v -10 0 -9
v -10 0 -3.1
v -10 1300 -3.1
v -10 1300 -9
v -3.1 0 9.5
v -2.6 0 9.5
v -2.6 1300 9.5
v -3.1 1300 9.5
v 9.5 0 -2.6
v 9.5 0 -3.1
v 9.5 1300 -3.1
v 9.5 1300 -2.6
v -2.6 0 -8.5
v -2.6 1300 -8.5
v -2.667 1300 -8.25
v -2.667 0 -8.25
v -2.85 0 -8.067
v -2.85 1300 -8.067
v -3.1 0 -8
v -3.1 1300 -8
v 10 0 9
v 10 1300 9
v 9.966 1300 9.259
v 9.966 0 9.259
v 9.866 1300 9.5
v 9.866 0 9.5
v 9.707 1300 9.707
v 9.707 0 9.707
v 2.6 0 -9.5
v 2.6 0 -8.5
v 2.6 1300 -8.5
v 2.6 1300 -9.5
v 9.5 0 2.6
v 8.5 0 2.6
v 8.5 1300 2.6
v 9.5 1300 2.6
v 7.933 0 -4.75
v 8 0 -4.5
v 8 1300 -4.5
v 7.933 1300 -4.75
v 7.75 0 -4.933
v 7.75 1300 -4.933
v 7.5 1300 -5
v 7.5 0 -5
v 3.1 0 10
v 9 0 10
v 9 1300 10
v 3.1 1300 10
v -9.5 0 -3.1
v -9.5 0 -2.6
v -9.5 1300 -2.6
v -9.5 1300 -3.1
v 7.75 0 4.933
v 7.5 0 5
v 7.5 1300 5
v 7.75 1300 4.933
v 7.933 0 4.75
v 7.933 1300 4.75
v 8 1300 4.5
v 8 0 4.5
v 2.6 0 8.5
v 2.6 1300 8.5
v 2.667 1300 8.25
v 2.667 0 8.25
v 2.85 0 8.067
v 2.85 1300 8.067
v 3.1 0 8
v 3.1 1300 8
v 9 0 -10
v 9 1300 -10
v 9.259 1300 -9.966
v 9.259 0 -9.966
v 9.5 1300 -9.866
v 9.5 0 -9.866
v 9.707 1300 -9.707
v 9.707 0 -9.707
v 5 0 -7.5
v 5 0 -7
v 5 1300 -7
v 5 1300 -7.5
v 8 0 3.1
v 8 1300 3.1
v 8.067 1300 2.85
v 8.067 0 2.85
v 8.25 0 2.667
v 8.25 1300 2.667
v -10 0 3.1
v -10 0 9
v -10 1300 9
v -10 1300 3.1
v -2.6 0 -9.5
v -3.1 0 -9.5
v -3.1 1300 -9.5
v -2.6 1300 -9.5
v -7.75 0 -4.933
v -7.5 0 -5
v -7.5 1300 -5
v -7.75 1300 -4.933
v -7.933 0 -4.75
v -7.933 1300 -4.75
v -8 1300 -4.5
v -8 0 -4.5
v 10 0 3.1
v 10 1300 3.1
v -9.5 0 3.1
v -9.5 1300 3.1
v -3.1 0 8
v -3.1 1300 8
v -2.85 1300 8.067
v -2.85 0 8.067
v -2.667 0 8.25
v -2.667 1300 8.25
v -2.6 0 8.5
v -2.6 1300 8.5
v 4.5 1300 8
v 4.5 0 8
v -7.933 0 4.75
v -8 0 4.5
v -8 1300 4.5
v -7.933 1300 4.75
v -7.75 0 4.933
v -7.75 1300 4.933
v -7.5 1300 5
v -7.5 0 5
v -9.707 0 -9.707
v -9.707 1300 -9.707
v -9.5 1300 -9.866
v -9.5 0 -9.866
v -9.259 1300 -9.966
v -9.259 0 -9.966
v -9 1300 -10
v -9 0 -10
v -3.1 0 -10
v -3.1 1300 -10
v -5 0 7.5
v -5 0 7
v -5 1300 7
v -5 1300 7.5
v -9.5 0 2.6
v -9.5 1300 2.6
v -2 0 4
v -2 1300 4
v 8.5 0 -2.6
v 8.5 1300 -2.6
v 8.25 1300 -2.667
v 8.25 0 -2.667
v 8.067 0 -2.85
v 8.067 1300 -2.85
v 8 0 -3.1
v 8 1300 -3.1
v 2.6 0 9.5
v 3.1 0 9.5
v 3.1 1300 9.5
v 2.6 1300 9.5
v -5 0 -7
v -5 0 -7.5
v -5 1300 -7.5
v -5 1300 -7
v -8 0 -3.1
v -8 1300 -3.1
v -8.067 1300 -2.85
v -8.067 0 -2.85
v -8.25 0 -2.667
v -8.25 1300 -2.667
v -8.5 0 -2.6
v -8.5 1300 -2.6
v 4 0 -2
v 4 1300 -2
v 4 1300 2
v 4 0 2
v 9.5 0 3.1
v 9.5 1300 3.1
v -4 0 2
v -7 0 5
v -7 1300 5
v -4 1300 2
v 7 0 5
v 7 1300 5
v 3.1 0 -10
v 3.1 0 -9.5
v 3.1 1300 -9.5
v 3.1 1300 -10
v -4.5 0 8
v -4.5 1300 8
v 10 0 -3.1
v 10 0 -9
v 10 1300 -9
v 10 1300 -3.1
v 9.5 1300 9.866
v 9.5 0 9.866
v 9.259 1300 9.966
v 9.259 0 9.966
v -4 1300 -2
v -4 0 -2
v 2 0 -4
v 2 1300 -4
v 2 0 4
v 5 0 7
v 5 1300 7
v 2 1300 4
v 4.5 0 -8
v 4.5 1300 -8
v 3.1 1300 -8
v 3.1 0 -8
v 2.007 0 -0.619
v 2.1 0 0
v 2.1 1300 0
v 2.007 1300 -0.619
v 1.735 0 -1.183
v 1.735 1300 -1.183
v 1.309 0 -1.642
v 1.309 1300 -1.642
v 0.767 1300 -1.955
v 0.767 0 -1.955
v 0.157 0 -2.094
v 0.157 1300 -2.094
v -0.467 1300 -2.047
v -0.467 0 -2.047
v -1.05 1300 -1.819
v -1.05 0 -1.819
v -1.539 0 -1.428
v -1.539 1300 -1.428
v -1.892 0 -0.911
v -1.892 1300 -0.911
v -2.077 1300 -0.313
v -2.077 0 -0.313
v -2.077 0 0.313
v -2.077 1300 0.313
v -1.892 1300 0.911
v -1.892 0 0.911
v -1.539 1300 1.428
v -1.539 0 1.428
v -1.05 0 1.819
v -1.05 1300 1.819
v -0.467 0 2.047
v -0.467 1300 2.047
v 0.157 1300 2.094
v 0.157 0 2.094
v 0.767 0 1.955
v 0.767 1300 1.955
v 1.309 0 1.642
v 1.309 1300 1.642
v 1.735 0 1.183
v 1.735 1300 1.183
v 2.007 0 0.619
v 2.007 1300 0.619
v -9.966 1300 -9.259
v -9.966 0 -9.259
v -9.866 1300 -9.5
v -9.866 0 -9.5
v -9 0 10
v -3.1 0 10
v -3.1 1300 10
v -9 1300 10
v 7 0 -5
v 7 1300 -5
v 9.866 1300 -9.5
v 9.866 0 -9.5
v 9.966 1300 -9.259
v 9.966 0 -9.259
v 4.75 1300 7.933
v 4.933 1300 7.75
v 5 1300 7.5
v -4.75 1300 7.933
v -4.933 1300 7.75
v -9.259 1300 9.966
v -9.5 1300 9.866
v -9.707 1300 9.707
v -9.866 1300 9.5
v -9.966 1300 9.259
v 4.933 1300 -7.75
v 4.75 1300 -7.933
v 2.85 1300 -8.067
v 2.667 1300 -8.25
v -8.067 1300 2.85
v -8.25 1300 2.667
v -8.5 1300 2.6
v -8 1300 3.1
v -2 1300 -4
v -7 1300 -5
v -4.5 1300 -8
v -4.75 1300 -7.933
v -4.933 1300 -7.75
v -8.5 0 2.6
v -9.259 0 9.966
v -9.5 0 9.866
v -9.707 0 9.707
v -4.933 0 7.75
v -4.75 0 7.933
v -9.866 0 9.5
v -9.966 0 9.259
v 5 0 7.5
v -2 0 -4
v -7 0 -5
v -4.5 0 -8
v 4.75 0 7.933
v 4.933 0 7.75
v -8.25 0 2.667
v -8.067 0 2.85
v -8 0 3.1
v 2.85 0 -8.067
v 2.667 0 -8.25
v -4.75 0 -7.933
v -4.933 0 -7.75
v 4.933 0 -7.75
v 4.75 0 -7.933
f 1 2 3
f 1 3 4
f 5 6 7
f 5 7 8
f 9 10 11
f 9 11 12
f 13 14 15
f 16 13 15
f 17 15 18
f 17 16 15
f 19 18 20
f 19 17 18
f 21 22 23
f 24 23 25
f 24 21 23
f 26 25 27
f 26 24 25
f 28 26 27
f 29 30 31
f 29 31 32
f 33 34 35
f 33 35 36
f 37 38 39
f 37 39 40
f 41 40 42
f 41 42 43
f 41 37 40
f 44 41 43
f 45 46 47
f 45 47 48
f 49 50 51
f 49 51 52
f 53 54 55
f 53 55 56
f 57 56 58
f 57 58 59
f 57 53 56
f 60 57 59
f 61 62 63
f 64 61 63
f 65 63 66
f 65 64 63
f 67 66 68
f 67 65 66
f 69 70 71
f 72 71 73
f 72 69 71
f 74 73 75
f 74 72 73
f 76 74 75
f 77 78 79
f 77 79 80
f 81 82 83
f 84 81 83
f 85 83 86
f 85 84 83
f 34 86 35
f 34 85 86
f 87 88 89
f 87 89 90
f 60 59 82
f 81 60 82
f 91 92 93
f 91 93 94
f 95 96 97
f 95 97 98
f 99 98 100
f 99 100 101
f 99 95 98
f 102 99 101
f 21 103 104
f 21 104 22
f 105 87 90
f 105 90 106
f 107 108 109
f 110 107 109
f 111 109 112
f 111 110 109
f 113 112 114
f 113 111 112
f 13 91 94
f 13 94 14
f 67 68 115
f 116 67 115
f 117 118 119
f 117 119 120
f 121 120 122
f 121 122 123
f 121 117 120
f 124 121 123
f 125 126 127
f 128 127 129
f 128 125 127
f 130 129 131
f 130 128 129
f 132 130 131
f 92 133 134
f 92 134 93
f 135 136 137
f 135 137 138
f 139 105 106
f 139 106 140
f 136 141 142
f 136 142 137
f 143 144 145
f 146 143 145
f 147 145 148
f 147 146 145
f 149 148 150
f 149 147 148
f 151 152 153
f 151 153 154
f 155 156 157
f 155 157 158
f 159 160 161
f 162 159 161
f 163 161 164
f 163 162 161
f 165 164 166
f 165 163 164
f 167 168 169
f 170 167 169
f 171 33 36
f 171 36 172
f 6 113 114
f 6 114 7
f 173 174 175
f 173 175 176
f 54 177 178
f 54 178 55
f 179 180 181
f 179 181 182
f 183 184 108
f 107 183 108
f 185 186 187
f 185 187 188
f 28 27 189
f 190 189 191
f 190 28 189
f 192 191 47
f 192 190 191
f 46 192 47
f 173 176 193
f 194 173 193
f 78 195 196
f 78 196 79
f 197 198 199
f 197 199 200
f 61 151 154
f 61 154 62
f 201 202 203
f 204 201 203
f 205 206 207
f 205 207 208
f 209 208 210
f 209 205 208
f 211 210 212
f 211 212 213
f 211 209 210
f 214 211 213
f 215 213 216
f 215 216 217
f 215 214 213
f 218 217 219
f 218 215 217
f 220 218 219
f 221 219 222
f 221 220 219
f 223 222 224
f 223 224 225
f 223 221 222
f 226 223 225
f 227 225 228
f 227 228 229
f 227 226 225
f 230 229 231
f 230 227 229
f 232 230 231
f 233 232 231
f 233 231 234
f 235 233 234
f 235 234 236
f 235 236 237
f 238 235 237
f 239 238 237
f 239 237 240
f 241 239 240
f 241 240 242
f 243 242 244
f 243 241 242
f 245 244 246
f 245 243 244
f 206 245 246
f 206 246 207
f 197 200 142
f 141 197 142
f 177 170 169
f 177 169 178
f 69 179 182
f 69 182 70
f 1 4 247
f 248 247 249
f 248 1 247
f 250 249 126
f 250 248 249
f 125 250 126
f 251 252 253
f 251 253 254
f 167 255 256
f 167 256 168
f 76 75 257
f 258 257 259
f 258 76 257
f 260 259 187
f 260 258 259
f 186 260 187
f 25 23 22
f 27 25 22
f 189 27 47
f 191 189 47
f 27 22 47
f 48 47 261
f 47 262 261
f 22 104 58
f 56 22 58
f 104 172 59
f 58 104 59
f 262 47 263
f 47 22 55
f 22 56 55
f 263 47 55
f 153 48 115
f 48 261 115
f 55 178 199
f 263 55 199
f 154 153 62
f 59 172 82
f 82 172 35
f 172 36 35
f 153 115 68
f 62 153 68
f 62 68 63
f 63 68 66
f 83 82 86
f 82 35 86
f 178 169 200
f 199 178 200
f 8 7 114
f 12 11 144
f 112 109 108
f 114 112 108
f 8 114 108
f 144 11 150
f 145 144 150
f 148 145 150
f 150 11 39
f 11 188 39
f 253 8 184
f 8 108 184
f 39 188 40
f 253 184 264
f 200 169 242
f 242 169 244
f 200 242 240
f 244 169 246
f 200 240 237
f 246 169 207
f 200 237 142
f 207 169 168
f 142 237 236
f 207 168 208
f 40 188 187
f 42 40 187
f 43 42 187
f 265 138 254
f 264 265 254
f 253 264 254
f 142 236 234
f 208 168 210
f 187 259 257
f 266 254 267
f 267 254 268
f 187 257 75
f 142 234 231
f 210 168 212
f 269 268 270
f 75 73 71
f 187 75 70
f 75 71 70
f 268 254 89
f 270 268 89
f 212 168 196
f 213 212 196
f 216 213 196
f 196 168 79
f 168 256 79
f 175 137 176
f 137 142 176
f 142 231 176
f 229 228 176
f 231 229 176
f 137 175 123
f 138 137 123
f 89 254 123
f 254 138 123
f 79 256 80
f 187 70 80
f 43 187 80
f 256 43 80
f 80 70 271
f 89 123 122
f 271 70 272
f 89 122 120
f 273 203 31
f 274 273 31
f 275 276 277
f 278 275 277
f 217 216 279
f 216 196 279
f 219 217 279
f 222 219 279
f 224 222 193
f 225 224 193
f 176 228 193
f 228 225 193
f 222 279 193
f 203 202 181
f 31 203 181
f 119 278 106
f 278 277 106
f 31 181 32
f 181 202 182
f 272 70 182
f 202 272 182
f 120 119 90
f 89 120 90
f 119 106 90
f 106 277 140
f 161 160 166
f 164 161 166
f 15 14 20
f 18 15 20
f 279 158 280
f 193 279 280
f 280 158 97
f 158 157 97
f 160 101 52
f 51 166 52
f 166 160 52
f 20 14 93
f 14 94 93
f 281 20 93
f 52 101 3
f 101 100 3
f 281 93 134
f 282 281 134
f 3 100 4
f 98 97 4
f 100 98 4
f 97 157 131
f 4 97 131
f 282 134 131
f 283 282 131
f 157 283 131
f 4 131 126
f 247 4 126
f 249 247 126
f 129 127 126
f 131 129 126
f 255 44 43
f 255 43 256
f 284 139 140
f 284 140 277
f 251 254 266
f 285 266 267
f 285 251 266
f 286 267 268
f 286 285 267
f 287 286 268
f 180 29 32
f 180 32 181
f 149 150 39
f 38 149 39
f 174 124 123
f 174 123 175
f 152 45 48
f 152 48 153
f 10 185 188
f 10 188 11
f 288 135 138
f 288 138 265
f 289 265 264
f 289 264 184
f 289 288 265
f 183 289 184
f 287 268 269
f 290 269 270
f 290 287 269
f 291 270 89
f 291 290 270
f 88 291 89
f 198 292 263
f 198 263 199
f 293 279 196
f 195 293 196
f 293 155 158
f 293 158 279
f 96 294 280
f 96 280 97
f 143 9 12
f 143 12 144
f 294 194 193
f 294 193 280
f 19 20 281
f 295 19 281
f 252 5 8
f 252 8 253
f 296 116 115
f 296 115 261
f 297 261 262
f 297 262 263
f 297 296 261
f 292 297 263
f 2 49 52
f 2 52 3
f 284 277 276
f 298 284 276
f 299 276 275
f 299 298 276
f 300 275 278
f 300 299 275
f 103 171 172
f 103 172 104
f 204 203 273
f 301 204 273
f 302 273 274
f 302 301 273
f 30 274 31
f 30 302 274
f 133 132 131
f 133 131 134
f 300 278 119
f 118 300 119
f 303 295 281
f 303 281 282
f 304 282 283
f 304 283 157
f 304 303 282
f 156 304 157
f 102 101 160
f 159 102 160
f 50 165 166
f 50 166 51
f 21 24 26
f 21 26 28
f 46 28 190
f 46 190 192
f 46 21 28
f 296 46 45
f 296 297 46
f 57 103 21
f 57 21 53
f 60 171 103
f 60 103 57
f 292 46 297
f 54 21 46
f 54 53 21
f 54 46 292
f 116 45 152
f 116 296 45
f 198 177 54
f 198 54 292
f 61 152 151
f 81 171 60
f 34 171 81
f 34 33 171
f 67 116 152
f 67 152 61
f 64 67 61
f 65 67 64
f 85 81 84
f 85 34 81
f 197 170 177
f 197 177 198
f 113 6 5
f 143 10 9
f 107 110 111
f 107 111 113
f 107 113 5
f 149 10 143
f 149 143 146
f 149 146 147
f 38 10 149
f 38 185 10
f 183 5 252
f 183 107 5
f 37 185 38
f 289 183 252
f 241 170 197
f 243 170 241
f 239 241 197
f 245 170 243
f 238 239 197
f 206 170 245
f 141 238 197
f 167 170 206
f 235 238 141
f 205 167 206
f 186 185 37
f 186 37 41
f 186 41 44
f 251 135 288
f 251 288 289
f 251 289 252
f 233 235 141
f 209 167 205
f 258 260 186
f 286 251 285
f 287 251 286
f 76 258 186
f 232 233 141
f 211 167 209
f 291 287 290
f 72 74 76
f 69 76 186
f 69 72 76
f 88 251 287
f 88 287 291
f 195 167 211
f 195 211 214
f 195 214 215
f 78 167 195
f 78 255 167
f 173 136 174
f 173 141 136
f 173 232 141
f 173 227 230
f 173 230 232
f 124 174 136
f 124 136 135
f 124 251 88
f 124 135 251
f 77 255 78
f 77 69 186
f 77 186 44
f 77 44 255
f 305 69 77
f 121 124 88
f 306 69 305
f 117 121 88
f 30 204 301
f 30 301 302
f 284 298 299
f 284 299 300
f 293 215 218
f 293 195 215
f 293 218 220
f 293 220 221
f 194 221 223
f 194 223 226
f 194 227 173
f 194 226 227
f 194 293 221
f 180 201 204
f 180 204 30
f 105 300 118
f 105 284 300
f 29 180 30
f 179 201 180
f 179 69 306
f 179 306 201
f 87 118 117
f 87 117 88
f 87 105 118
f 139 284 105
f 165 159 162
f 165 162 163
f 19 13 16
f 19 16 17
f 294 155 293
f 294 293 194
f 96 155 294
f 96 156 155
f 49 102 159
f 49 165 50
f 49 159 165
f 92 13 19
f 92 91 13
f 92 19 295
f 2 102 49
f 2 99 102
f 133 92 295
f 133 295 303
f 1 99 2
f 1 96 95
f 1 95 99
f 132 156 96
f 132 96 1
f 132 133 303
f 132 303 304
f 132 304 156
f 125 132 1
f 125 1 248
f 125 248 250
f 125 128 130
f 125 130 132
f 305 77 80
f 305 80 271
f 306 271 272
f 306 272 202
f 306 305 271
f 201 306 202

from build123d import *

# Parameters (mm, degrees)
SKETCH_1_R      = 2.1
EXTRUDE_1_DEPTH = 1300


with BuildPart() as part:
    # 스케치1 → 보스-돌출1 (new body)
    with BuildSketch(Plane(origin=(0, 0, 0), x_dir=(1, 0, 0), z_dir=(0, 1, 0))):
        with BuildLine():
            Line((2, -4), (-2, -4))
            Line((-2, -4), (-5, -7))
            Line((-5, -7), (-5, -7.5))
            ThreePointArc((-5, -7.5), (-4.853553391, -7.853553391), (-4.5, -8))
            Line((-4.5, -8), (-3.1, -8))
            ThreePointArc((-3.1, -8), (-2.746446609, -8.146446609), (-2.6, -8.5))
            Line((-2.6, -8.5), (-2.6, -9.5))
            Line((-2.6, -9.5), (-3.1, -9.5))
            Line((-3.1, -9.5), (-3.1, -10))
            Line((-3.1, -10), (-9, -10))
            ThreePointArc((-9, -10), (-9.382683432, -9.923879533), (-9.707106781, -9.707106781))
            ThreePointArc((-9.707106781, -9.707106781), (-9.923879533, -9.382683432), (-10, -9))
            Line((-10, -9), (-10, -3.1))
            Line((-10, -3.1), (-9.5, -3.1))
            Line((-9.5, -3.1), (-9.5, -2.6))
            Line((-9.5, -2.6), (-8.5, -2.6))
            ThreePointArc((-8.5, -2.6), (-8.146446609, -2.746446609), (-8, -3.1))
            Line((-8, -3.1), (-8, -4.5))
            ThreePointArc((-8, -4.5), (-7.853553391, -4.853553391), (-7.5, -5))
            Line((-7.5, -5), (-7, -5))
            Line((-7, -5), (-4, -2))
            Line((-4, -2), (-4, 2))
            Line((-4, 2), (-7, 5))
            Line((-7, 5), (-7.5, 5))
            ThreePointArc((-7.5, 5), (-7.853553391, 4.853553391), (-8, 4.5))
            Line((-8, 4.5), (-8, 3.1))
            ThreePointArc((-8, 3.1), (-8.146446609, 2.746446609), (-8.5, 2.6))
            Line((-8.5, 2.6), (-9.5, 2.6))
            Line((-9.5, 2.6), (-9.5, 3.1))
            Line((-9.5, 3.1), (-10, 3.1))
            Line((-10, 3.1), (-10, 9))
            ThreePointArc((-10, 9), (-9.923879533, 9.382683432), (-9.707106781, 9.707106781))
            ThreePointArc((-9.707106781, 9.707106781), (-9.382683432, 9.923879533), (-9, 10))
            Line((-9, 10), (-3.1, 10))
            Line((-3.1, 10), (-3.1, 9.5))
            Line((-3.1, 9.5), (-2.6, 9.5))
            Line((-2.6, 9.5), (-2.6, 8.5))
            ThreePointArc((-2.6, 8.5), (-2.746446609, 8.146446609), (-3.1, 8))
            Line((-3.1, 8), (-4.5, 8))
            ThreePointArc((-4.5, 8), (-4.853553391, 7.853553391), (-5, 7.5))
            Line((-5, 7.5), (-5, 7))
            Line((-5, 7), (-2, 4))
            Line((-2, 4), (2, 4))
            Line((2, 4), (5, 7))
            Line((5, 7), (5, 7.5))
            ThreePointArc((5, 7.5), (4.853553391, 7.853553391), (4.5, 8))
            Line((4.5, 8), (3.1, 8))
            ThreePointArc((3.1, 8), (2.746446609, 8.146446609), (2.6, 8.5))
            Line((2.6, 8.5), (2.6, 9.5))
            Line((2.6, 9.5), (3.1, 9.5))
            Line((3.1, 9.5), (3.1, 10))
            Line((3.1, 10), (9, 10))
            ThreePointArc((9, 10), (9.382683432, 9.923879533), (9.707106781, 9.707106781))
            ThreePointArc((9.707106781, 9.707106781), (9.923879533, 9.382683432), (10, 9))
            Line((10, 9), (10, 3.1))
            Line((10, 3.1), (9.5, 3.1))
            Line((9.5, 3.1), (9.5, 2.6))
            Line((9.5, 2.6), (8.5, 2.6))
            ThreePointArc((8.5, 2.6), (8.146446609, 2.746446609), (8, 3.1))
            Line((8, 3.1), (8, 4.5))
            ThreePointArc((8, 4.5), (7.853553391, 4.853553391), (7.5, 5))
            Line((7.5, 5), (7, 5))
            Line((7, 5), (4, 2))
            Line((4, 2), (4, -2))
            Line((4, -2), (7, -5))
            Line((7, -5), (7.5, -5))
            ThreePointArc((7.5, -5), (7.853553391, -4.853553391), (8, -4.5))
            Line((8, -4.5), (8, -3.1))
            ThreePointArc((8, -3.1), (8.146446609, -2.746446609), (8.5, -2.6))
            Line((8.5, -2.6), (9.5, -2.6))
            Line((9.5, -2.6), (9.5, -3.1))
            Line((9.5, -3.1), (10, -3.1))
            Line((10, -3.1), (10, -9))
            ThreePointArc((10, -9), (9.923879533, -9.382683432), (9.707106781, -9.707106781))
            ThreePointArc((9.707106781, -9.707106781), (9.382683432, -9.923879533), (9, -10))
            Line((9, -10), (3.1, -10))
            Line((3.1, -10), (3.1, -9.5))
            Line((3.1, -9.5), (2.6, -9.5))
            Line((2.6, -9.5), (2.6, -8.5))
            ThreePointArc((2.6, -8.5), (2.746446609, -8.146446609), (3.1, -8))
            Line((3.1, -8), (4.5, -8))
            ThreePointArc((4.5, -8), (4.853553391, -7.853553391), (5, -7.5))
            Line((5, -7.5), (5, -7))
            Line((5, -7), (2, -4))
        make_face()
        Circle(SKETCH_1_R, mode=Mode.SUBTRACT)
    extrude(amount=EXTRUDE_1_DEPTH)


solid = part.part
